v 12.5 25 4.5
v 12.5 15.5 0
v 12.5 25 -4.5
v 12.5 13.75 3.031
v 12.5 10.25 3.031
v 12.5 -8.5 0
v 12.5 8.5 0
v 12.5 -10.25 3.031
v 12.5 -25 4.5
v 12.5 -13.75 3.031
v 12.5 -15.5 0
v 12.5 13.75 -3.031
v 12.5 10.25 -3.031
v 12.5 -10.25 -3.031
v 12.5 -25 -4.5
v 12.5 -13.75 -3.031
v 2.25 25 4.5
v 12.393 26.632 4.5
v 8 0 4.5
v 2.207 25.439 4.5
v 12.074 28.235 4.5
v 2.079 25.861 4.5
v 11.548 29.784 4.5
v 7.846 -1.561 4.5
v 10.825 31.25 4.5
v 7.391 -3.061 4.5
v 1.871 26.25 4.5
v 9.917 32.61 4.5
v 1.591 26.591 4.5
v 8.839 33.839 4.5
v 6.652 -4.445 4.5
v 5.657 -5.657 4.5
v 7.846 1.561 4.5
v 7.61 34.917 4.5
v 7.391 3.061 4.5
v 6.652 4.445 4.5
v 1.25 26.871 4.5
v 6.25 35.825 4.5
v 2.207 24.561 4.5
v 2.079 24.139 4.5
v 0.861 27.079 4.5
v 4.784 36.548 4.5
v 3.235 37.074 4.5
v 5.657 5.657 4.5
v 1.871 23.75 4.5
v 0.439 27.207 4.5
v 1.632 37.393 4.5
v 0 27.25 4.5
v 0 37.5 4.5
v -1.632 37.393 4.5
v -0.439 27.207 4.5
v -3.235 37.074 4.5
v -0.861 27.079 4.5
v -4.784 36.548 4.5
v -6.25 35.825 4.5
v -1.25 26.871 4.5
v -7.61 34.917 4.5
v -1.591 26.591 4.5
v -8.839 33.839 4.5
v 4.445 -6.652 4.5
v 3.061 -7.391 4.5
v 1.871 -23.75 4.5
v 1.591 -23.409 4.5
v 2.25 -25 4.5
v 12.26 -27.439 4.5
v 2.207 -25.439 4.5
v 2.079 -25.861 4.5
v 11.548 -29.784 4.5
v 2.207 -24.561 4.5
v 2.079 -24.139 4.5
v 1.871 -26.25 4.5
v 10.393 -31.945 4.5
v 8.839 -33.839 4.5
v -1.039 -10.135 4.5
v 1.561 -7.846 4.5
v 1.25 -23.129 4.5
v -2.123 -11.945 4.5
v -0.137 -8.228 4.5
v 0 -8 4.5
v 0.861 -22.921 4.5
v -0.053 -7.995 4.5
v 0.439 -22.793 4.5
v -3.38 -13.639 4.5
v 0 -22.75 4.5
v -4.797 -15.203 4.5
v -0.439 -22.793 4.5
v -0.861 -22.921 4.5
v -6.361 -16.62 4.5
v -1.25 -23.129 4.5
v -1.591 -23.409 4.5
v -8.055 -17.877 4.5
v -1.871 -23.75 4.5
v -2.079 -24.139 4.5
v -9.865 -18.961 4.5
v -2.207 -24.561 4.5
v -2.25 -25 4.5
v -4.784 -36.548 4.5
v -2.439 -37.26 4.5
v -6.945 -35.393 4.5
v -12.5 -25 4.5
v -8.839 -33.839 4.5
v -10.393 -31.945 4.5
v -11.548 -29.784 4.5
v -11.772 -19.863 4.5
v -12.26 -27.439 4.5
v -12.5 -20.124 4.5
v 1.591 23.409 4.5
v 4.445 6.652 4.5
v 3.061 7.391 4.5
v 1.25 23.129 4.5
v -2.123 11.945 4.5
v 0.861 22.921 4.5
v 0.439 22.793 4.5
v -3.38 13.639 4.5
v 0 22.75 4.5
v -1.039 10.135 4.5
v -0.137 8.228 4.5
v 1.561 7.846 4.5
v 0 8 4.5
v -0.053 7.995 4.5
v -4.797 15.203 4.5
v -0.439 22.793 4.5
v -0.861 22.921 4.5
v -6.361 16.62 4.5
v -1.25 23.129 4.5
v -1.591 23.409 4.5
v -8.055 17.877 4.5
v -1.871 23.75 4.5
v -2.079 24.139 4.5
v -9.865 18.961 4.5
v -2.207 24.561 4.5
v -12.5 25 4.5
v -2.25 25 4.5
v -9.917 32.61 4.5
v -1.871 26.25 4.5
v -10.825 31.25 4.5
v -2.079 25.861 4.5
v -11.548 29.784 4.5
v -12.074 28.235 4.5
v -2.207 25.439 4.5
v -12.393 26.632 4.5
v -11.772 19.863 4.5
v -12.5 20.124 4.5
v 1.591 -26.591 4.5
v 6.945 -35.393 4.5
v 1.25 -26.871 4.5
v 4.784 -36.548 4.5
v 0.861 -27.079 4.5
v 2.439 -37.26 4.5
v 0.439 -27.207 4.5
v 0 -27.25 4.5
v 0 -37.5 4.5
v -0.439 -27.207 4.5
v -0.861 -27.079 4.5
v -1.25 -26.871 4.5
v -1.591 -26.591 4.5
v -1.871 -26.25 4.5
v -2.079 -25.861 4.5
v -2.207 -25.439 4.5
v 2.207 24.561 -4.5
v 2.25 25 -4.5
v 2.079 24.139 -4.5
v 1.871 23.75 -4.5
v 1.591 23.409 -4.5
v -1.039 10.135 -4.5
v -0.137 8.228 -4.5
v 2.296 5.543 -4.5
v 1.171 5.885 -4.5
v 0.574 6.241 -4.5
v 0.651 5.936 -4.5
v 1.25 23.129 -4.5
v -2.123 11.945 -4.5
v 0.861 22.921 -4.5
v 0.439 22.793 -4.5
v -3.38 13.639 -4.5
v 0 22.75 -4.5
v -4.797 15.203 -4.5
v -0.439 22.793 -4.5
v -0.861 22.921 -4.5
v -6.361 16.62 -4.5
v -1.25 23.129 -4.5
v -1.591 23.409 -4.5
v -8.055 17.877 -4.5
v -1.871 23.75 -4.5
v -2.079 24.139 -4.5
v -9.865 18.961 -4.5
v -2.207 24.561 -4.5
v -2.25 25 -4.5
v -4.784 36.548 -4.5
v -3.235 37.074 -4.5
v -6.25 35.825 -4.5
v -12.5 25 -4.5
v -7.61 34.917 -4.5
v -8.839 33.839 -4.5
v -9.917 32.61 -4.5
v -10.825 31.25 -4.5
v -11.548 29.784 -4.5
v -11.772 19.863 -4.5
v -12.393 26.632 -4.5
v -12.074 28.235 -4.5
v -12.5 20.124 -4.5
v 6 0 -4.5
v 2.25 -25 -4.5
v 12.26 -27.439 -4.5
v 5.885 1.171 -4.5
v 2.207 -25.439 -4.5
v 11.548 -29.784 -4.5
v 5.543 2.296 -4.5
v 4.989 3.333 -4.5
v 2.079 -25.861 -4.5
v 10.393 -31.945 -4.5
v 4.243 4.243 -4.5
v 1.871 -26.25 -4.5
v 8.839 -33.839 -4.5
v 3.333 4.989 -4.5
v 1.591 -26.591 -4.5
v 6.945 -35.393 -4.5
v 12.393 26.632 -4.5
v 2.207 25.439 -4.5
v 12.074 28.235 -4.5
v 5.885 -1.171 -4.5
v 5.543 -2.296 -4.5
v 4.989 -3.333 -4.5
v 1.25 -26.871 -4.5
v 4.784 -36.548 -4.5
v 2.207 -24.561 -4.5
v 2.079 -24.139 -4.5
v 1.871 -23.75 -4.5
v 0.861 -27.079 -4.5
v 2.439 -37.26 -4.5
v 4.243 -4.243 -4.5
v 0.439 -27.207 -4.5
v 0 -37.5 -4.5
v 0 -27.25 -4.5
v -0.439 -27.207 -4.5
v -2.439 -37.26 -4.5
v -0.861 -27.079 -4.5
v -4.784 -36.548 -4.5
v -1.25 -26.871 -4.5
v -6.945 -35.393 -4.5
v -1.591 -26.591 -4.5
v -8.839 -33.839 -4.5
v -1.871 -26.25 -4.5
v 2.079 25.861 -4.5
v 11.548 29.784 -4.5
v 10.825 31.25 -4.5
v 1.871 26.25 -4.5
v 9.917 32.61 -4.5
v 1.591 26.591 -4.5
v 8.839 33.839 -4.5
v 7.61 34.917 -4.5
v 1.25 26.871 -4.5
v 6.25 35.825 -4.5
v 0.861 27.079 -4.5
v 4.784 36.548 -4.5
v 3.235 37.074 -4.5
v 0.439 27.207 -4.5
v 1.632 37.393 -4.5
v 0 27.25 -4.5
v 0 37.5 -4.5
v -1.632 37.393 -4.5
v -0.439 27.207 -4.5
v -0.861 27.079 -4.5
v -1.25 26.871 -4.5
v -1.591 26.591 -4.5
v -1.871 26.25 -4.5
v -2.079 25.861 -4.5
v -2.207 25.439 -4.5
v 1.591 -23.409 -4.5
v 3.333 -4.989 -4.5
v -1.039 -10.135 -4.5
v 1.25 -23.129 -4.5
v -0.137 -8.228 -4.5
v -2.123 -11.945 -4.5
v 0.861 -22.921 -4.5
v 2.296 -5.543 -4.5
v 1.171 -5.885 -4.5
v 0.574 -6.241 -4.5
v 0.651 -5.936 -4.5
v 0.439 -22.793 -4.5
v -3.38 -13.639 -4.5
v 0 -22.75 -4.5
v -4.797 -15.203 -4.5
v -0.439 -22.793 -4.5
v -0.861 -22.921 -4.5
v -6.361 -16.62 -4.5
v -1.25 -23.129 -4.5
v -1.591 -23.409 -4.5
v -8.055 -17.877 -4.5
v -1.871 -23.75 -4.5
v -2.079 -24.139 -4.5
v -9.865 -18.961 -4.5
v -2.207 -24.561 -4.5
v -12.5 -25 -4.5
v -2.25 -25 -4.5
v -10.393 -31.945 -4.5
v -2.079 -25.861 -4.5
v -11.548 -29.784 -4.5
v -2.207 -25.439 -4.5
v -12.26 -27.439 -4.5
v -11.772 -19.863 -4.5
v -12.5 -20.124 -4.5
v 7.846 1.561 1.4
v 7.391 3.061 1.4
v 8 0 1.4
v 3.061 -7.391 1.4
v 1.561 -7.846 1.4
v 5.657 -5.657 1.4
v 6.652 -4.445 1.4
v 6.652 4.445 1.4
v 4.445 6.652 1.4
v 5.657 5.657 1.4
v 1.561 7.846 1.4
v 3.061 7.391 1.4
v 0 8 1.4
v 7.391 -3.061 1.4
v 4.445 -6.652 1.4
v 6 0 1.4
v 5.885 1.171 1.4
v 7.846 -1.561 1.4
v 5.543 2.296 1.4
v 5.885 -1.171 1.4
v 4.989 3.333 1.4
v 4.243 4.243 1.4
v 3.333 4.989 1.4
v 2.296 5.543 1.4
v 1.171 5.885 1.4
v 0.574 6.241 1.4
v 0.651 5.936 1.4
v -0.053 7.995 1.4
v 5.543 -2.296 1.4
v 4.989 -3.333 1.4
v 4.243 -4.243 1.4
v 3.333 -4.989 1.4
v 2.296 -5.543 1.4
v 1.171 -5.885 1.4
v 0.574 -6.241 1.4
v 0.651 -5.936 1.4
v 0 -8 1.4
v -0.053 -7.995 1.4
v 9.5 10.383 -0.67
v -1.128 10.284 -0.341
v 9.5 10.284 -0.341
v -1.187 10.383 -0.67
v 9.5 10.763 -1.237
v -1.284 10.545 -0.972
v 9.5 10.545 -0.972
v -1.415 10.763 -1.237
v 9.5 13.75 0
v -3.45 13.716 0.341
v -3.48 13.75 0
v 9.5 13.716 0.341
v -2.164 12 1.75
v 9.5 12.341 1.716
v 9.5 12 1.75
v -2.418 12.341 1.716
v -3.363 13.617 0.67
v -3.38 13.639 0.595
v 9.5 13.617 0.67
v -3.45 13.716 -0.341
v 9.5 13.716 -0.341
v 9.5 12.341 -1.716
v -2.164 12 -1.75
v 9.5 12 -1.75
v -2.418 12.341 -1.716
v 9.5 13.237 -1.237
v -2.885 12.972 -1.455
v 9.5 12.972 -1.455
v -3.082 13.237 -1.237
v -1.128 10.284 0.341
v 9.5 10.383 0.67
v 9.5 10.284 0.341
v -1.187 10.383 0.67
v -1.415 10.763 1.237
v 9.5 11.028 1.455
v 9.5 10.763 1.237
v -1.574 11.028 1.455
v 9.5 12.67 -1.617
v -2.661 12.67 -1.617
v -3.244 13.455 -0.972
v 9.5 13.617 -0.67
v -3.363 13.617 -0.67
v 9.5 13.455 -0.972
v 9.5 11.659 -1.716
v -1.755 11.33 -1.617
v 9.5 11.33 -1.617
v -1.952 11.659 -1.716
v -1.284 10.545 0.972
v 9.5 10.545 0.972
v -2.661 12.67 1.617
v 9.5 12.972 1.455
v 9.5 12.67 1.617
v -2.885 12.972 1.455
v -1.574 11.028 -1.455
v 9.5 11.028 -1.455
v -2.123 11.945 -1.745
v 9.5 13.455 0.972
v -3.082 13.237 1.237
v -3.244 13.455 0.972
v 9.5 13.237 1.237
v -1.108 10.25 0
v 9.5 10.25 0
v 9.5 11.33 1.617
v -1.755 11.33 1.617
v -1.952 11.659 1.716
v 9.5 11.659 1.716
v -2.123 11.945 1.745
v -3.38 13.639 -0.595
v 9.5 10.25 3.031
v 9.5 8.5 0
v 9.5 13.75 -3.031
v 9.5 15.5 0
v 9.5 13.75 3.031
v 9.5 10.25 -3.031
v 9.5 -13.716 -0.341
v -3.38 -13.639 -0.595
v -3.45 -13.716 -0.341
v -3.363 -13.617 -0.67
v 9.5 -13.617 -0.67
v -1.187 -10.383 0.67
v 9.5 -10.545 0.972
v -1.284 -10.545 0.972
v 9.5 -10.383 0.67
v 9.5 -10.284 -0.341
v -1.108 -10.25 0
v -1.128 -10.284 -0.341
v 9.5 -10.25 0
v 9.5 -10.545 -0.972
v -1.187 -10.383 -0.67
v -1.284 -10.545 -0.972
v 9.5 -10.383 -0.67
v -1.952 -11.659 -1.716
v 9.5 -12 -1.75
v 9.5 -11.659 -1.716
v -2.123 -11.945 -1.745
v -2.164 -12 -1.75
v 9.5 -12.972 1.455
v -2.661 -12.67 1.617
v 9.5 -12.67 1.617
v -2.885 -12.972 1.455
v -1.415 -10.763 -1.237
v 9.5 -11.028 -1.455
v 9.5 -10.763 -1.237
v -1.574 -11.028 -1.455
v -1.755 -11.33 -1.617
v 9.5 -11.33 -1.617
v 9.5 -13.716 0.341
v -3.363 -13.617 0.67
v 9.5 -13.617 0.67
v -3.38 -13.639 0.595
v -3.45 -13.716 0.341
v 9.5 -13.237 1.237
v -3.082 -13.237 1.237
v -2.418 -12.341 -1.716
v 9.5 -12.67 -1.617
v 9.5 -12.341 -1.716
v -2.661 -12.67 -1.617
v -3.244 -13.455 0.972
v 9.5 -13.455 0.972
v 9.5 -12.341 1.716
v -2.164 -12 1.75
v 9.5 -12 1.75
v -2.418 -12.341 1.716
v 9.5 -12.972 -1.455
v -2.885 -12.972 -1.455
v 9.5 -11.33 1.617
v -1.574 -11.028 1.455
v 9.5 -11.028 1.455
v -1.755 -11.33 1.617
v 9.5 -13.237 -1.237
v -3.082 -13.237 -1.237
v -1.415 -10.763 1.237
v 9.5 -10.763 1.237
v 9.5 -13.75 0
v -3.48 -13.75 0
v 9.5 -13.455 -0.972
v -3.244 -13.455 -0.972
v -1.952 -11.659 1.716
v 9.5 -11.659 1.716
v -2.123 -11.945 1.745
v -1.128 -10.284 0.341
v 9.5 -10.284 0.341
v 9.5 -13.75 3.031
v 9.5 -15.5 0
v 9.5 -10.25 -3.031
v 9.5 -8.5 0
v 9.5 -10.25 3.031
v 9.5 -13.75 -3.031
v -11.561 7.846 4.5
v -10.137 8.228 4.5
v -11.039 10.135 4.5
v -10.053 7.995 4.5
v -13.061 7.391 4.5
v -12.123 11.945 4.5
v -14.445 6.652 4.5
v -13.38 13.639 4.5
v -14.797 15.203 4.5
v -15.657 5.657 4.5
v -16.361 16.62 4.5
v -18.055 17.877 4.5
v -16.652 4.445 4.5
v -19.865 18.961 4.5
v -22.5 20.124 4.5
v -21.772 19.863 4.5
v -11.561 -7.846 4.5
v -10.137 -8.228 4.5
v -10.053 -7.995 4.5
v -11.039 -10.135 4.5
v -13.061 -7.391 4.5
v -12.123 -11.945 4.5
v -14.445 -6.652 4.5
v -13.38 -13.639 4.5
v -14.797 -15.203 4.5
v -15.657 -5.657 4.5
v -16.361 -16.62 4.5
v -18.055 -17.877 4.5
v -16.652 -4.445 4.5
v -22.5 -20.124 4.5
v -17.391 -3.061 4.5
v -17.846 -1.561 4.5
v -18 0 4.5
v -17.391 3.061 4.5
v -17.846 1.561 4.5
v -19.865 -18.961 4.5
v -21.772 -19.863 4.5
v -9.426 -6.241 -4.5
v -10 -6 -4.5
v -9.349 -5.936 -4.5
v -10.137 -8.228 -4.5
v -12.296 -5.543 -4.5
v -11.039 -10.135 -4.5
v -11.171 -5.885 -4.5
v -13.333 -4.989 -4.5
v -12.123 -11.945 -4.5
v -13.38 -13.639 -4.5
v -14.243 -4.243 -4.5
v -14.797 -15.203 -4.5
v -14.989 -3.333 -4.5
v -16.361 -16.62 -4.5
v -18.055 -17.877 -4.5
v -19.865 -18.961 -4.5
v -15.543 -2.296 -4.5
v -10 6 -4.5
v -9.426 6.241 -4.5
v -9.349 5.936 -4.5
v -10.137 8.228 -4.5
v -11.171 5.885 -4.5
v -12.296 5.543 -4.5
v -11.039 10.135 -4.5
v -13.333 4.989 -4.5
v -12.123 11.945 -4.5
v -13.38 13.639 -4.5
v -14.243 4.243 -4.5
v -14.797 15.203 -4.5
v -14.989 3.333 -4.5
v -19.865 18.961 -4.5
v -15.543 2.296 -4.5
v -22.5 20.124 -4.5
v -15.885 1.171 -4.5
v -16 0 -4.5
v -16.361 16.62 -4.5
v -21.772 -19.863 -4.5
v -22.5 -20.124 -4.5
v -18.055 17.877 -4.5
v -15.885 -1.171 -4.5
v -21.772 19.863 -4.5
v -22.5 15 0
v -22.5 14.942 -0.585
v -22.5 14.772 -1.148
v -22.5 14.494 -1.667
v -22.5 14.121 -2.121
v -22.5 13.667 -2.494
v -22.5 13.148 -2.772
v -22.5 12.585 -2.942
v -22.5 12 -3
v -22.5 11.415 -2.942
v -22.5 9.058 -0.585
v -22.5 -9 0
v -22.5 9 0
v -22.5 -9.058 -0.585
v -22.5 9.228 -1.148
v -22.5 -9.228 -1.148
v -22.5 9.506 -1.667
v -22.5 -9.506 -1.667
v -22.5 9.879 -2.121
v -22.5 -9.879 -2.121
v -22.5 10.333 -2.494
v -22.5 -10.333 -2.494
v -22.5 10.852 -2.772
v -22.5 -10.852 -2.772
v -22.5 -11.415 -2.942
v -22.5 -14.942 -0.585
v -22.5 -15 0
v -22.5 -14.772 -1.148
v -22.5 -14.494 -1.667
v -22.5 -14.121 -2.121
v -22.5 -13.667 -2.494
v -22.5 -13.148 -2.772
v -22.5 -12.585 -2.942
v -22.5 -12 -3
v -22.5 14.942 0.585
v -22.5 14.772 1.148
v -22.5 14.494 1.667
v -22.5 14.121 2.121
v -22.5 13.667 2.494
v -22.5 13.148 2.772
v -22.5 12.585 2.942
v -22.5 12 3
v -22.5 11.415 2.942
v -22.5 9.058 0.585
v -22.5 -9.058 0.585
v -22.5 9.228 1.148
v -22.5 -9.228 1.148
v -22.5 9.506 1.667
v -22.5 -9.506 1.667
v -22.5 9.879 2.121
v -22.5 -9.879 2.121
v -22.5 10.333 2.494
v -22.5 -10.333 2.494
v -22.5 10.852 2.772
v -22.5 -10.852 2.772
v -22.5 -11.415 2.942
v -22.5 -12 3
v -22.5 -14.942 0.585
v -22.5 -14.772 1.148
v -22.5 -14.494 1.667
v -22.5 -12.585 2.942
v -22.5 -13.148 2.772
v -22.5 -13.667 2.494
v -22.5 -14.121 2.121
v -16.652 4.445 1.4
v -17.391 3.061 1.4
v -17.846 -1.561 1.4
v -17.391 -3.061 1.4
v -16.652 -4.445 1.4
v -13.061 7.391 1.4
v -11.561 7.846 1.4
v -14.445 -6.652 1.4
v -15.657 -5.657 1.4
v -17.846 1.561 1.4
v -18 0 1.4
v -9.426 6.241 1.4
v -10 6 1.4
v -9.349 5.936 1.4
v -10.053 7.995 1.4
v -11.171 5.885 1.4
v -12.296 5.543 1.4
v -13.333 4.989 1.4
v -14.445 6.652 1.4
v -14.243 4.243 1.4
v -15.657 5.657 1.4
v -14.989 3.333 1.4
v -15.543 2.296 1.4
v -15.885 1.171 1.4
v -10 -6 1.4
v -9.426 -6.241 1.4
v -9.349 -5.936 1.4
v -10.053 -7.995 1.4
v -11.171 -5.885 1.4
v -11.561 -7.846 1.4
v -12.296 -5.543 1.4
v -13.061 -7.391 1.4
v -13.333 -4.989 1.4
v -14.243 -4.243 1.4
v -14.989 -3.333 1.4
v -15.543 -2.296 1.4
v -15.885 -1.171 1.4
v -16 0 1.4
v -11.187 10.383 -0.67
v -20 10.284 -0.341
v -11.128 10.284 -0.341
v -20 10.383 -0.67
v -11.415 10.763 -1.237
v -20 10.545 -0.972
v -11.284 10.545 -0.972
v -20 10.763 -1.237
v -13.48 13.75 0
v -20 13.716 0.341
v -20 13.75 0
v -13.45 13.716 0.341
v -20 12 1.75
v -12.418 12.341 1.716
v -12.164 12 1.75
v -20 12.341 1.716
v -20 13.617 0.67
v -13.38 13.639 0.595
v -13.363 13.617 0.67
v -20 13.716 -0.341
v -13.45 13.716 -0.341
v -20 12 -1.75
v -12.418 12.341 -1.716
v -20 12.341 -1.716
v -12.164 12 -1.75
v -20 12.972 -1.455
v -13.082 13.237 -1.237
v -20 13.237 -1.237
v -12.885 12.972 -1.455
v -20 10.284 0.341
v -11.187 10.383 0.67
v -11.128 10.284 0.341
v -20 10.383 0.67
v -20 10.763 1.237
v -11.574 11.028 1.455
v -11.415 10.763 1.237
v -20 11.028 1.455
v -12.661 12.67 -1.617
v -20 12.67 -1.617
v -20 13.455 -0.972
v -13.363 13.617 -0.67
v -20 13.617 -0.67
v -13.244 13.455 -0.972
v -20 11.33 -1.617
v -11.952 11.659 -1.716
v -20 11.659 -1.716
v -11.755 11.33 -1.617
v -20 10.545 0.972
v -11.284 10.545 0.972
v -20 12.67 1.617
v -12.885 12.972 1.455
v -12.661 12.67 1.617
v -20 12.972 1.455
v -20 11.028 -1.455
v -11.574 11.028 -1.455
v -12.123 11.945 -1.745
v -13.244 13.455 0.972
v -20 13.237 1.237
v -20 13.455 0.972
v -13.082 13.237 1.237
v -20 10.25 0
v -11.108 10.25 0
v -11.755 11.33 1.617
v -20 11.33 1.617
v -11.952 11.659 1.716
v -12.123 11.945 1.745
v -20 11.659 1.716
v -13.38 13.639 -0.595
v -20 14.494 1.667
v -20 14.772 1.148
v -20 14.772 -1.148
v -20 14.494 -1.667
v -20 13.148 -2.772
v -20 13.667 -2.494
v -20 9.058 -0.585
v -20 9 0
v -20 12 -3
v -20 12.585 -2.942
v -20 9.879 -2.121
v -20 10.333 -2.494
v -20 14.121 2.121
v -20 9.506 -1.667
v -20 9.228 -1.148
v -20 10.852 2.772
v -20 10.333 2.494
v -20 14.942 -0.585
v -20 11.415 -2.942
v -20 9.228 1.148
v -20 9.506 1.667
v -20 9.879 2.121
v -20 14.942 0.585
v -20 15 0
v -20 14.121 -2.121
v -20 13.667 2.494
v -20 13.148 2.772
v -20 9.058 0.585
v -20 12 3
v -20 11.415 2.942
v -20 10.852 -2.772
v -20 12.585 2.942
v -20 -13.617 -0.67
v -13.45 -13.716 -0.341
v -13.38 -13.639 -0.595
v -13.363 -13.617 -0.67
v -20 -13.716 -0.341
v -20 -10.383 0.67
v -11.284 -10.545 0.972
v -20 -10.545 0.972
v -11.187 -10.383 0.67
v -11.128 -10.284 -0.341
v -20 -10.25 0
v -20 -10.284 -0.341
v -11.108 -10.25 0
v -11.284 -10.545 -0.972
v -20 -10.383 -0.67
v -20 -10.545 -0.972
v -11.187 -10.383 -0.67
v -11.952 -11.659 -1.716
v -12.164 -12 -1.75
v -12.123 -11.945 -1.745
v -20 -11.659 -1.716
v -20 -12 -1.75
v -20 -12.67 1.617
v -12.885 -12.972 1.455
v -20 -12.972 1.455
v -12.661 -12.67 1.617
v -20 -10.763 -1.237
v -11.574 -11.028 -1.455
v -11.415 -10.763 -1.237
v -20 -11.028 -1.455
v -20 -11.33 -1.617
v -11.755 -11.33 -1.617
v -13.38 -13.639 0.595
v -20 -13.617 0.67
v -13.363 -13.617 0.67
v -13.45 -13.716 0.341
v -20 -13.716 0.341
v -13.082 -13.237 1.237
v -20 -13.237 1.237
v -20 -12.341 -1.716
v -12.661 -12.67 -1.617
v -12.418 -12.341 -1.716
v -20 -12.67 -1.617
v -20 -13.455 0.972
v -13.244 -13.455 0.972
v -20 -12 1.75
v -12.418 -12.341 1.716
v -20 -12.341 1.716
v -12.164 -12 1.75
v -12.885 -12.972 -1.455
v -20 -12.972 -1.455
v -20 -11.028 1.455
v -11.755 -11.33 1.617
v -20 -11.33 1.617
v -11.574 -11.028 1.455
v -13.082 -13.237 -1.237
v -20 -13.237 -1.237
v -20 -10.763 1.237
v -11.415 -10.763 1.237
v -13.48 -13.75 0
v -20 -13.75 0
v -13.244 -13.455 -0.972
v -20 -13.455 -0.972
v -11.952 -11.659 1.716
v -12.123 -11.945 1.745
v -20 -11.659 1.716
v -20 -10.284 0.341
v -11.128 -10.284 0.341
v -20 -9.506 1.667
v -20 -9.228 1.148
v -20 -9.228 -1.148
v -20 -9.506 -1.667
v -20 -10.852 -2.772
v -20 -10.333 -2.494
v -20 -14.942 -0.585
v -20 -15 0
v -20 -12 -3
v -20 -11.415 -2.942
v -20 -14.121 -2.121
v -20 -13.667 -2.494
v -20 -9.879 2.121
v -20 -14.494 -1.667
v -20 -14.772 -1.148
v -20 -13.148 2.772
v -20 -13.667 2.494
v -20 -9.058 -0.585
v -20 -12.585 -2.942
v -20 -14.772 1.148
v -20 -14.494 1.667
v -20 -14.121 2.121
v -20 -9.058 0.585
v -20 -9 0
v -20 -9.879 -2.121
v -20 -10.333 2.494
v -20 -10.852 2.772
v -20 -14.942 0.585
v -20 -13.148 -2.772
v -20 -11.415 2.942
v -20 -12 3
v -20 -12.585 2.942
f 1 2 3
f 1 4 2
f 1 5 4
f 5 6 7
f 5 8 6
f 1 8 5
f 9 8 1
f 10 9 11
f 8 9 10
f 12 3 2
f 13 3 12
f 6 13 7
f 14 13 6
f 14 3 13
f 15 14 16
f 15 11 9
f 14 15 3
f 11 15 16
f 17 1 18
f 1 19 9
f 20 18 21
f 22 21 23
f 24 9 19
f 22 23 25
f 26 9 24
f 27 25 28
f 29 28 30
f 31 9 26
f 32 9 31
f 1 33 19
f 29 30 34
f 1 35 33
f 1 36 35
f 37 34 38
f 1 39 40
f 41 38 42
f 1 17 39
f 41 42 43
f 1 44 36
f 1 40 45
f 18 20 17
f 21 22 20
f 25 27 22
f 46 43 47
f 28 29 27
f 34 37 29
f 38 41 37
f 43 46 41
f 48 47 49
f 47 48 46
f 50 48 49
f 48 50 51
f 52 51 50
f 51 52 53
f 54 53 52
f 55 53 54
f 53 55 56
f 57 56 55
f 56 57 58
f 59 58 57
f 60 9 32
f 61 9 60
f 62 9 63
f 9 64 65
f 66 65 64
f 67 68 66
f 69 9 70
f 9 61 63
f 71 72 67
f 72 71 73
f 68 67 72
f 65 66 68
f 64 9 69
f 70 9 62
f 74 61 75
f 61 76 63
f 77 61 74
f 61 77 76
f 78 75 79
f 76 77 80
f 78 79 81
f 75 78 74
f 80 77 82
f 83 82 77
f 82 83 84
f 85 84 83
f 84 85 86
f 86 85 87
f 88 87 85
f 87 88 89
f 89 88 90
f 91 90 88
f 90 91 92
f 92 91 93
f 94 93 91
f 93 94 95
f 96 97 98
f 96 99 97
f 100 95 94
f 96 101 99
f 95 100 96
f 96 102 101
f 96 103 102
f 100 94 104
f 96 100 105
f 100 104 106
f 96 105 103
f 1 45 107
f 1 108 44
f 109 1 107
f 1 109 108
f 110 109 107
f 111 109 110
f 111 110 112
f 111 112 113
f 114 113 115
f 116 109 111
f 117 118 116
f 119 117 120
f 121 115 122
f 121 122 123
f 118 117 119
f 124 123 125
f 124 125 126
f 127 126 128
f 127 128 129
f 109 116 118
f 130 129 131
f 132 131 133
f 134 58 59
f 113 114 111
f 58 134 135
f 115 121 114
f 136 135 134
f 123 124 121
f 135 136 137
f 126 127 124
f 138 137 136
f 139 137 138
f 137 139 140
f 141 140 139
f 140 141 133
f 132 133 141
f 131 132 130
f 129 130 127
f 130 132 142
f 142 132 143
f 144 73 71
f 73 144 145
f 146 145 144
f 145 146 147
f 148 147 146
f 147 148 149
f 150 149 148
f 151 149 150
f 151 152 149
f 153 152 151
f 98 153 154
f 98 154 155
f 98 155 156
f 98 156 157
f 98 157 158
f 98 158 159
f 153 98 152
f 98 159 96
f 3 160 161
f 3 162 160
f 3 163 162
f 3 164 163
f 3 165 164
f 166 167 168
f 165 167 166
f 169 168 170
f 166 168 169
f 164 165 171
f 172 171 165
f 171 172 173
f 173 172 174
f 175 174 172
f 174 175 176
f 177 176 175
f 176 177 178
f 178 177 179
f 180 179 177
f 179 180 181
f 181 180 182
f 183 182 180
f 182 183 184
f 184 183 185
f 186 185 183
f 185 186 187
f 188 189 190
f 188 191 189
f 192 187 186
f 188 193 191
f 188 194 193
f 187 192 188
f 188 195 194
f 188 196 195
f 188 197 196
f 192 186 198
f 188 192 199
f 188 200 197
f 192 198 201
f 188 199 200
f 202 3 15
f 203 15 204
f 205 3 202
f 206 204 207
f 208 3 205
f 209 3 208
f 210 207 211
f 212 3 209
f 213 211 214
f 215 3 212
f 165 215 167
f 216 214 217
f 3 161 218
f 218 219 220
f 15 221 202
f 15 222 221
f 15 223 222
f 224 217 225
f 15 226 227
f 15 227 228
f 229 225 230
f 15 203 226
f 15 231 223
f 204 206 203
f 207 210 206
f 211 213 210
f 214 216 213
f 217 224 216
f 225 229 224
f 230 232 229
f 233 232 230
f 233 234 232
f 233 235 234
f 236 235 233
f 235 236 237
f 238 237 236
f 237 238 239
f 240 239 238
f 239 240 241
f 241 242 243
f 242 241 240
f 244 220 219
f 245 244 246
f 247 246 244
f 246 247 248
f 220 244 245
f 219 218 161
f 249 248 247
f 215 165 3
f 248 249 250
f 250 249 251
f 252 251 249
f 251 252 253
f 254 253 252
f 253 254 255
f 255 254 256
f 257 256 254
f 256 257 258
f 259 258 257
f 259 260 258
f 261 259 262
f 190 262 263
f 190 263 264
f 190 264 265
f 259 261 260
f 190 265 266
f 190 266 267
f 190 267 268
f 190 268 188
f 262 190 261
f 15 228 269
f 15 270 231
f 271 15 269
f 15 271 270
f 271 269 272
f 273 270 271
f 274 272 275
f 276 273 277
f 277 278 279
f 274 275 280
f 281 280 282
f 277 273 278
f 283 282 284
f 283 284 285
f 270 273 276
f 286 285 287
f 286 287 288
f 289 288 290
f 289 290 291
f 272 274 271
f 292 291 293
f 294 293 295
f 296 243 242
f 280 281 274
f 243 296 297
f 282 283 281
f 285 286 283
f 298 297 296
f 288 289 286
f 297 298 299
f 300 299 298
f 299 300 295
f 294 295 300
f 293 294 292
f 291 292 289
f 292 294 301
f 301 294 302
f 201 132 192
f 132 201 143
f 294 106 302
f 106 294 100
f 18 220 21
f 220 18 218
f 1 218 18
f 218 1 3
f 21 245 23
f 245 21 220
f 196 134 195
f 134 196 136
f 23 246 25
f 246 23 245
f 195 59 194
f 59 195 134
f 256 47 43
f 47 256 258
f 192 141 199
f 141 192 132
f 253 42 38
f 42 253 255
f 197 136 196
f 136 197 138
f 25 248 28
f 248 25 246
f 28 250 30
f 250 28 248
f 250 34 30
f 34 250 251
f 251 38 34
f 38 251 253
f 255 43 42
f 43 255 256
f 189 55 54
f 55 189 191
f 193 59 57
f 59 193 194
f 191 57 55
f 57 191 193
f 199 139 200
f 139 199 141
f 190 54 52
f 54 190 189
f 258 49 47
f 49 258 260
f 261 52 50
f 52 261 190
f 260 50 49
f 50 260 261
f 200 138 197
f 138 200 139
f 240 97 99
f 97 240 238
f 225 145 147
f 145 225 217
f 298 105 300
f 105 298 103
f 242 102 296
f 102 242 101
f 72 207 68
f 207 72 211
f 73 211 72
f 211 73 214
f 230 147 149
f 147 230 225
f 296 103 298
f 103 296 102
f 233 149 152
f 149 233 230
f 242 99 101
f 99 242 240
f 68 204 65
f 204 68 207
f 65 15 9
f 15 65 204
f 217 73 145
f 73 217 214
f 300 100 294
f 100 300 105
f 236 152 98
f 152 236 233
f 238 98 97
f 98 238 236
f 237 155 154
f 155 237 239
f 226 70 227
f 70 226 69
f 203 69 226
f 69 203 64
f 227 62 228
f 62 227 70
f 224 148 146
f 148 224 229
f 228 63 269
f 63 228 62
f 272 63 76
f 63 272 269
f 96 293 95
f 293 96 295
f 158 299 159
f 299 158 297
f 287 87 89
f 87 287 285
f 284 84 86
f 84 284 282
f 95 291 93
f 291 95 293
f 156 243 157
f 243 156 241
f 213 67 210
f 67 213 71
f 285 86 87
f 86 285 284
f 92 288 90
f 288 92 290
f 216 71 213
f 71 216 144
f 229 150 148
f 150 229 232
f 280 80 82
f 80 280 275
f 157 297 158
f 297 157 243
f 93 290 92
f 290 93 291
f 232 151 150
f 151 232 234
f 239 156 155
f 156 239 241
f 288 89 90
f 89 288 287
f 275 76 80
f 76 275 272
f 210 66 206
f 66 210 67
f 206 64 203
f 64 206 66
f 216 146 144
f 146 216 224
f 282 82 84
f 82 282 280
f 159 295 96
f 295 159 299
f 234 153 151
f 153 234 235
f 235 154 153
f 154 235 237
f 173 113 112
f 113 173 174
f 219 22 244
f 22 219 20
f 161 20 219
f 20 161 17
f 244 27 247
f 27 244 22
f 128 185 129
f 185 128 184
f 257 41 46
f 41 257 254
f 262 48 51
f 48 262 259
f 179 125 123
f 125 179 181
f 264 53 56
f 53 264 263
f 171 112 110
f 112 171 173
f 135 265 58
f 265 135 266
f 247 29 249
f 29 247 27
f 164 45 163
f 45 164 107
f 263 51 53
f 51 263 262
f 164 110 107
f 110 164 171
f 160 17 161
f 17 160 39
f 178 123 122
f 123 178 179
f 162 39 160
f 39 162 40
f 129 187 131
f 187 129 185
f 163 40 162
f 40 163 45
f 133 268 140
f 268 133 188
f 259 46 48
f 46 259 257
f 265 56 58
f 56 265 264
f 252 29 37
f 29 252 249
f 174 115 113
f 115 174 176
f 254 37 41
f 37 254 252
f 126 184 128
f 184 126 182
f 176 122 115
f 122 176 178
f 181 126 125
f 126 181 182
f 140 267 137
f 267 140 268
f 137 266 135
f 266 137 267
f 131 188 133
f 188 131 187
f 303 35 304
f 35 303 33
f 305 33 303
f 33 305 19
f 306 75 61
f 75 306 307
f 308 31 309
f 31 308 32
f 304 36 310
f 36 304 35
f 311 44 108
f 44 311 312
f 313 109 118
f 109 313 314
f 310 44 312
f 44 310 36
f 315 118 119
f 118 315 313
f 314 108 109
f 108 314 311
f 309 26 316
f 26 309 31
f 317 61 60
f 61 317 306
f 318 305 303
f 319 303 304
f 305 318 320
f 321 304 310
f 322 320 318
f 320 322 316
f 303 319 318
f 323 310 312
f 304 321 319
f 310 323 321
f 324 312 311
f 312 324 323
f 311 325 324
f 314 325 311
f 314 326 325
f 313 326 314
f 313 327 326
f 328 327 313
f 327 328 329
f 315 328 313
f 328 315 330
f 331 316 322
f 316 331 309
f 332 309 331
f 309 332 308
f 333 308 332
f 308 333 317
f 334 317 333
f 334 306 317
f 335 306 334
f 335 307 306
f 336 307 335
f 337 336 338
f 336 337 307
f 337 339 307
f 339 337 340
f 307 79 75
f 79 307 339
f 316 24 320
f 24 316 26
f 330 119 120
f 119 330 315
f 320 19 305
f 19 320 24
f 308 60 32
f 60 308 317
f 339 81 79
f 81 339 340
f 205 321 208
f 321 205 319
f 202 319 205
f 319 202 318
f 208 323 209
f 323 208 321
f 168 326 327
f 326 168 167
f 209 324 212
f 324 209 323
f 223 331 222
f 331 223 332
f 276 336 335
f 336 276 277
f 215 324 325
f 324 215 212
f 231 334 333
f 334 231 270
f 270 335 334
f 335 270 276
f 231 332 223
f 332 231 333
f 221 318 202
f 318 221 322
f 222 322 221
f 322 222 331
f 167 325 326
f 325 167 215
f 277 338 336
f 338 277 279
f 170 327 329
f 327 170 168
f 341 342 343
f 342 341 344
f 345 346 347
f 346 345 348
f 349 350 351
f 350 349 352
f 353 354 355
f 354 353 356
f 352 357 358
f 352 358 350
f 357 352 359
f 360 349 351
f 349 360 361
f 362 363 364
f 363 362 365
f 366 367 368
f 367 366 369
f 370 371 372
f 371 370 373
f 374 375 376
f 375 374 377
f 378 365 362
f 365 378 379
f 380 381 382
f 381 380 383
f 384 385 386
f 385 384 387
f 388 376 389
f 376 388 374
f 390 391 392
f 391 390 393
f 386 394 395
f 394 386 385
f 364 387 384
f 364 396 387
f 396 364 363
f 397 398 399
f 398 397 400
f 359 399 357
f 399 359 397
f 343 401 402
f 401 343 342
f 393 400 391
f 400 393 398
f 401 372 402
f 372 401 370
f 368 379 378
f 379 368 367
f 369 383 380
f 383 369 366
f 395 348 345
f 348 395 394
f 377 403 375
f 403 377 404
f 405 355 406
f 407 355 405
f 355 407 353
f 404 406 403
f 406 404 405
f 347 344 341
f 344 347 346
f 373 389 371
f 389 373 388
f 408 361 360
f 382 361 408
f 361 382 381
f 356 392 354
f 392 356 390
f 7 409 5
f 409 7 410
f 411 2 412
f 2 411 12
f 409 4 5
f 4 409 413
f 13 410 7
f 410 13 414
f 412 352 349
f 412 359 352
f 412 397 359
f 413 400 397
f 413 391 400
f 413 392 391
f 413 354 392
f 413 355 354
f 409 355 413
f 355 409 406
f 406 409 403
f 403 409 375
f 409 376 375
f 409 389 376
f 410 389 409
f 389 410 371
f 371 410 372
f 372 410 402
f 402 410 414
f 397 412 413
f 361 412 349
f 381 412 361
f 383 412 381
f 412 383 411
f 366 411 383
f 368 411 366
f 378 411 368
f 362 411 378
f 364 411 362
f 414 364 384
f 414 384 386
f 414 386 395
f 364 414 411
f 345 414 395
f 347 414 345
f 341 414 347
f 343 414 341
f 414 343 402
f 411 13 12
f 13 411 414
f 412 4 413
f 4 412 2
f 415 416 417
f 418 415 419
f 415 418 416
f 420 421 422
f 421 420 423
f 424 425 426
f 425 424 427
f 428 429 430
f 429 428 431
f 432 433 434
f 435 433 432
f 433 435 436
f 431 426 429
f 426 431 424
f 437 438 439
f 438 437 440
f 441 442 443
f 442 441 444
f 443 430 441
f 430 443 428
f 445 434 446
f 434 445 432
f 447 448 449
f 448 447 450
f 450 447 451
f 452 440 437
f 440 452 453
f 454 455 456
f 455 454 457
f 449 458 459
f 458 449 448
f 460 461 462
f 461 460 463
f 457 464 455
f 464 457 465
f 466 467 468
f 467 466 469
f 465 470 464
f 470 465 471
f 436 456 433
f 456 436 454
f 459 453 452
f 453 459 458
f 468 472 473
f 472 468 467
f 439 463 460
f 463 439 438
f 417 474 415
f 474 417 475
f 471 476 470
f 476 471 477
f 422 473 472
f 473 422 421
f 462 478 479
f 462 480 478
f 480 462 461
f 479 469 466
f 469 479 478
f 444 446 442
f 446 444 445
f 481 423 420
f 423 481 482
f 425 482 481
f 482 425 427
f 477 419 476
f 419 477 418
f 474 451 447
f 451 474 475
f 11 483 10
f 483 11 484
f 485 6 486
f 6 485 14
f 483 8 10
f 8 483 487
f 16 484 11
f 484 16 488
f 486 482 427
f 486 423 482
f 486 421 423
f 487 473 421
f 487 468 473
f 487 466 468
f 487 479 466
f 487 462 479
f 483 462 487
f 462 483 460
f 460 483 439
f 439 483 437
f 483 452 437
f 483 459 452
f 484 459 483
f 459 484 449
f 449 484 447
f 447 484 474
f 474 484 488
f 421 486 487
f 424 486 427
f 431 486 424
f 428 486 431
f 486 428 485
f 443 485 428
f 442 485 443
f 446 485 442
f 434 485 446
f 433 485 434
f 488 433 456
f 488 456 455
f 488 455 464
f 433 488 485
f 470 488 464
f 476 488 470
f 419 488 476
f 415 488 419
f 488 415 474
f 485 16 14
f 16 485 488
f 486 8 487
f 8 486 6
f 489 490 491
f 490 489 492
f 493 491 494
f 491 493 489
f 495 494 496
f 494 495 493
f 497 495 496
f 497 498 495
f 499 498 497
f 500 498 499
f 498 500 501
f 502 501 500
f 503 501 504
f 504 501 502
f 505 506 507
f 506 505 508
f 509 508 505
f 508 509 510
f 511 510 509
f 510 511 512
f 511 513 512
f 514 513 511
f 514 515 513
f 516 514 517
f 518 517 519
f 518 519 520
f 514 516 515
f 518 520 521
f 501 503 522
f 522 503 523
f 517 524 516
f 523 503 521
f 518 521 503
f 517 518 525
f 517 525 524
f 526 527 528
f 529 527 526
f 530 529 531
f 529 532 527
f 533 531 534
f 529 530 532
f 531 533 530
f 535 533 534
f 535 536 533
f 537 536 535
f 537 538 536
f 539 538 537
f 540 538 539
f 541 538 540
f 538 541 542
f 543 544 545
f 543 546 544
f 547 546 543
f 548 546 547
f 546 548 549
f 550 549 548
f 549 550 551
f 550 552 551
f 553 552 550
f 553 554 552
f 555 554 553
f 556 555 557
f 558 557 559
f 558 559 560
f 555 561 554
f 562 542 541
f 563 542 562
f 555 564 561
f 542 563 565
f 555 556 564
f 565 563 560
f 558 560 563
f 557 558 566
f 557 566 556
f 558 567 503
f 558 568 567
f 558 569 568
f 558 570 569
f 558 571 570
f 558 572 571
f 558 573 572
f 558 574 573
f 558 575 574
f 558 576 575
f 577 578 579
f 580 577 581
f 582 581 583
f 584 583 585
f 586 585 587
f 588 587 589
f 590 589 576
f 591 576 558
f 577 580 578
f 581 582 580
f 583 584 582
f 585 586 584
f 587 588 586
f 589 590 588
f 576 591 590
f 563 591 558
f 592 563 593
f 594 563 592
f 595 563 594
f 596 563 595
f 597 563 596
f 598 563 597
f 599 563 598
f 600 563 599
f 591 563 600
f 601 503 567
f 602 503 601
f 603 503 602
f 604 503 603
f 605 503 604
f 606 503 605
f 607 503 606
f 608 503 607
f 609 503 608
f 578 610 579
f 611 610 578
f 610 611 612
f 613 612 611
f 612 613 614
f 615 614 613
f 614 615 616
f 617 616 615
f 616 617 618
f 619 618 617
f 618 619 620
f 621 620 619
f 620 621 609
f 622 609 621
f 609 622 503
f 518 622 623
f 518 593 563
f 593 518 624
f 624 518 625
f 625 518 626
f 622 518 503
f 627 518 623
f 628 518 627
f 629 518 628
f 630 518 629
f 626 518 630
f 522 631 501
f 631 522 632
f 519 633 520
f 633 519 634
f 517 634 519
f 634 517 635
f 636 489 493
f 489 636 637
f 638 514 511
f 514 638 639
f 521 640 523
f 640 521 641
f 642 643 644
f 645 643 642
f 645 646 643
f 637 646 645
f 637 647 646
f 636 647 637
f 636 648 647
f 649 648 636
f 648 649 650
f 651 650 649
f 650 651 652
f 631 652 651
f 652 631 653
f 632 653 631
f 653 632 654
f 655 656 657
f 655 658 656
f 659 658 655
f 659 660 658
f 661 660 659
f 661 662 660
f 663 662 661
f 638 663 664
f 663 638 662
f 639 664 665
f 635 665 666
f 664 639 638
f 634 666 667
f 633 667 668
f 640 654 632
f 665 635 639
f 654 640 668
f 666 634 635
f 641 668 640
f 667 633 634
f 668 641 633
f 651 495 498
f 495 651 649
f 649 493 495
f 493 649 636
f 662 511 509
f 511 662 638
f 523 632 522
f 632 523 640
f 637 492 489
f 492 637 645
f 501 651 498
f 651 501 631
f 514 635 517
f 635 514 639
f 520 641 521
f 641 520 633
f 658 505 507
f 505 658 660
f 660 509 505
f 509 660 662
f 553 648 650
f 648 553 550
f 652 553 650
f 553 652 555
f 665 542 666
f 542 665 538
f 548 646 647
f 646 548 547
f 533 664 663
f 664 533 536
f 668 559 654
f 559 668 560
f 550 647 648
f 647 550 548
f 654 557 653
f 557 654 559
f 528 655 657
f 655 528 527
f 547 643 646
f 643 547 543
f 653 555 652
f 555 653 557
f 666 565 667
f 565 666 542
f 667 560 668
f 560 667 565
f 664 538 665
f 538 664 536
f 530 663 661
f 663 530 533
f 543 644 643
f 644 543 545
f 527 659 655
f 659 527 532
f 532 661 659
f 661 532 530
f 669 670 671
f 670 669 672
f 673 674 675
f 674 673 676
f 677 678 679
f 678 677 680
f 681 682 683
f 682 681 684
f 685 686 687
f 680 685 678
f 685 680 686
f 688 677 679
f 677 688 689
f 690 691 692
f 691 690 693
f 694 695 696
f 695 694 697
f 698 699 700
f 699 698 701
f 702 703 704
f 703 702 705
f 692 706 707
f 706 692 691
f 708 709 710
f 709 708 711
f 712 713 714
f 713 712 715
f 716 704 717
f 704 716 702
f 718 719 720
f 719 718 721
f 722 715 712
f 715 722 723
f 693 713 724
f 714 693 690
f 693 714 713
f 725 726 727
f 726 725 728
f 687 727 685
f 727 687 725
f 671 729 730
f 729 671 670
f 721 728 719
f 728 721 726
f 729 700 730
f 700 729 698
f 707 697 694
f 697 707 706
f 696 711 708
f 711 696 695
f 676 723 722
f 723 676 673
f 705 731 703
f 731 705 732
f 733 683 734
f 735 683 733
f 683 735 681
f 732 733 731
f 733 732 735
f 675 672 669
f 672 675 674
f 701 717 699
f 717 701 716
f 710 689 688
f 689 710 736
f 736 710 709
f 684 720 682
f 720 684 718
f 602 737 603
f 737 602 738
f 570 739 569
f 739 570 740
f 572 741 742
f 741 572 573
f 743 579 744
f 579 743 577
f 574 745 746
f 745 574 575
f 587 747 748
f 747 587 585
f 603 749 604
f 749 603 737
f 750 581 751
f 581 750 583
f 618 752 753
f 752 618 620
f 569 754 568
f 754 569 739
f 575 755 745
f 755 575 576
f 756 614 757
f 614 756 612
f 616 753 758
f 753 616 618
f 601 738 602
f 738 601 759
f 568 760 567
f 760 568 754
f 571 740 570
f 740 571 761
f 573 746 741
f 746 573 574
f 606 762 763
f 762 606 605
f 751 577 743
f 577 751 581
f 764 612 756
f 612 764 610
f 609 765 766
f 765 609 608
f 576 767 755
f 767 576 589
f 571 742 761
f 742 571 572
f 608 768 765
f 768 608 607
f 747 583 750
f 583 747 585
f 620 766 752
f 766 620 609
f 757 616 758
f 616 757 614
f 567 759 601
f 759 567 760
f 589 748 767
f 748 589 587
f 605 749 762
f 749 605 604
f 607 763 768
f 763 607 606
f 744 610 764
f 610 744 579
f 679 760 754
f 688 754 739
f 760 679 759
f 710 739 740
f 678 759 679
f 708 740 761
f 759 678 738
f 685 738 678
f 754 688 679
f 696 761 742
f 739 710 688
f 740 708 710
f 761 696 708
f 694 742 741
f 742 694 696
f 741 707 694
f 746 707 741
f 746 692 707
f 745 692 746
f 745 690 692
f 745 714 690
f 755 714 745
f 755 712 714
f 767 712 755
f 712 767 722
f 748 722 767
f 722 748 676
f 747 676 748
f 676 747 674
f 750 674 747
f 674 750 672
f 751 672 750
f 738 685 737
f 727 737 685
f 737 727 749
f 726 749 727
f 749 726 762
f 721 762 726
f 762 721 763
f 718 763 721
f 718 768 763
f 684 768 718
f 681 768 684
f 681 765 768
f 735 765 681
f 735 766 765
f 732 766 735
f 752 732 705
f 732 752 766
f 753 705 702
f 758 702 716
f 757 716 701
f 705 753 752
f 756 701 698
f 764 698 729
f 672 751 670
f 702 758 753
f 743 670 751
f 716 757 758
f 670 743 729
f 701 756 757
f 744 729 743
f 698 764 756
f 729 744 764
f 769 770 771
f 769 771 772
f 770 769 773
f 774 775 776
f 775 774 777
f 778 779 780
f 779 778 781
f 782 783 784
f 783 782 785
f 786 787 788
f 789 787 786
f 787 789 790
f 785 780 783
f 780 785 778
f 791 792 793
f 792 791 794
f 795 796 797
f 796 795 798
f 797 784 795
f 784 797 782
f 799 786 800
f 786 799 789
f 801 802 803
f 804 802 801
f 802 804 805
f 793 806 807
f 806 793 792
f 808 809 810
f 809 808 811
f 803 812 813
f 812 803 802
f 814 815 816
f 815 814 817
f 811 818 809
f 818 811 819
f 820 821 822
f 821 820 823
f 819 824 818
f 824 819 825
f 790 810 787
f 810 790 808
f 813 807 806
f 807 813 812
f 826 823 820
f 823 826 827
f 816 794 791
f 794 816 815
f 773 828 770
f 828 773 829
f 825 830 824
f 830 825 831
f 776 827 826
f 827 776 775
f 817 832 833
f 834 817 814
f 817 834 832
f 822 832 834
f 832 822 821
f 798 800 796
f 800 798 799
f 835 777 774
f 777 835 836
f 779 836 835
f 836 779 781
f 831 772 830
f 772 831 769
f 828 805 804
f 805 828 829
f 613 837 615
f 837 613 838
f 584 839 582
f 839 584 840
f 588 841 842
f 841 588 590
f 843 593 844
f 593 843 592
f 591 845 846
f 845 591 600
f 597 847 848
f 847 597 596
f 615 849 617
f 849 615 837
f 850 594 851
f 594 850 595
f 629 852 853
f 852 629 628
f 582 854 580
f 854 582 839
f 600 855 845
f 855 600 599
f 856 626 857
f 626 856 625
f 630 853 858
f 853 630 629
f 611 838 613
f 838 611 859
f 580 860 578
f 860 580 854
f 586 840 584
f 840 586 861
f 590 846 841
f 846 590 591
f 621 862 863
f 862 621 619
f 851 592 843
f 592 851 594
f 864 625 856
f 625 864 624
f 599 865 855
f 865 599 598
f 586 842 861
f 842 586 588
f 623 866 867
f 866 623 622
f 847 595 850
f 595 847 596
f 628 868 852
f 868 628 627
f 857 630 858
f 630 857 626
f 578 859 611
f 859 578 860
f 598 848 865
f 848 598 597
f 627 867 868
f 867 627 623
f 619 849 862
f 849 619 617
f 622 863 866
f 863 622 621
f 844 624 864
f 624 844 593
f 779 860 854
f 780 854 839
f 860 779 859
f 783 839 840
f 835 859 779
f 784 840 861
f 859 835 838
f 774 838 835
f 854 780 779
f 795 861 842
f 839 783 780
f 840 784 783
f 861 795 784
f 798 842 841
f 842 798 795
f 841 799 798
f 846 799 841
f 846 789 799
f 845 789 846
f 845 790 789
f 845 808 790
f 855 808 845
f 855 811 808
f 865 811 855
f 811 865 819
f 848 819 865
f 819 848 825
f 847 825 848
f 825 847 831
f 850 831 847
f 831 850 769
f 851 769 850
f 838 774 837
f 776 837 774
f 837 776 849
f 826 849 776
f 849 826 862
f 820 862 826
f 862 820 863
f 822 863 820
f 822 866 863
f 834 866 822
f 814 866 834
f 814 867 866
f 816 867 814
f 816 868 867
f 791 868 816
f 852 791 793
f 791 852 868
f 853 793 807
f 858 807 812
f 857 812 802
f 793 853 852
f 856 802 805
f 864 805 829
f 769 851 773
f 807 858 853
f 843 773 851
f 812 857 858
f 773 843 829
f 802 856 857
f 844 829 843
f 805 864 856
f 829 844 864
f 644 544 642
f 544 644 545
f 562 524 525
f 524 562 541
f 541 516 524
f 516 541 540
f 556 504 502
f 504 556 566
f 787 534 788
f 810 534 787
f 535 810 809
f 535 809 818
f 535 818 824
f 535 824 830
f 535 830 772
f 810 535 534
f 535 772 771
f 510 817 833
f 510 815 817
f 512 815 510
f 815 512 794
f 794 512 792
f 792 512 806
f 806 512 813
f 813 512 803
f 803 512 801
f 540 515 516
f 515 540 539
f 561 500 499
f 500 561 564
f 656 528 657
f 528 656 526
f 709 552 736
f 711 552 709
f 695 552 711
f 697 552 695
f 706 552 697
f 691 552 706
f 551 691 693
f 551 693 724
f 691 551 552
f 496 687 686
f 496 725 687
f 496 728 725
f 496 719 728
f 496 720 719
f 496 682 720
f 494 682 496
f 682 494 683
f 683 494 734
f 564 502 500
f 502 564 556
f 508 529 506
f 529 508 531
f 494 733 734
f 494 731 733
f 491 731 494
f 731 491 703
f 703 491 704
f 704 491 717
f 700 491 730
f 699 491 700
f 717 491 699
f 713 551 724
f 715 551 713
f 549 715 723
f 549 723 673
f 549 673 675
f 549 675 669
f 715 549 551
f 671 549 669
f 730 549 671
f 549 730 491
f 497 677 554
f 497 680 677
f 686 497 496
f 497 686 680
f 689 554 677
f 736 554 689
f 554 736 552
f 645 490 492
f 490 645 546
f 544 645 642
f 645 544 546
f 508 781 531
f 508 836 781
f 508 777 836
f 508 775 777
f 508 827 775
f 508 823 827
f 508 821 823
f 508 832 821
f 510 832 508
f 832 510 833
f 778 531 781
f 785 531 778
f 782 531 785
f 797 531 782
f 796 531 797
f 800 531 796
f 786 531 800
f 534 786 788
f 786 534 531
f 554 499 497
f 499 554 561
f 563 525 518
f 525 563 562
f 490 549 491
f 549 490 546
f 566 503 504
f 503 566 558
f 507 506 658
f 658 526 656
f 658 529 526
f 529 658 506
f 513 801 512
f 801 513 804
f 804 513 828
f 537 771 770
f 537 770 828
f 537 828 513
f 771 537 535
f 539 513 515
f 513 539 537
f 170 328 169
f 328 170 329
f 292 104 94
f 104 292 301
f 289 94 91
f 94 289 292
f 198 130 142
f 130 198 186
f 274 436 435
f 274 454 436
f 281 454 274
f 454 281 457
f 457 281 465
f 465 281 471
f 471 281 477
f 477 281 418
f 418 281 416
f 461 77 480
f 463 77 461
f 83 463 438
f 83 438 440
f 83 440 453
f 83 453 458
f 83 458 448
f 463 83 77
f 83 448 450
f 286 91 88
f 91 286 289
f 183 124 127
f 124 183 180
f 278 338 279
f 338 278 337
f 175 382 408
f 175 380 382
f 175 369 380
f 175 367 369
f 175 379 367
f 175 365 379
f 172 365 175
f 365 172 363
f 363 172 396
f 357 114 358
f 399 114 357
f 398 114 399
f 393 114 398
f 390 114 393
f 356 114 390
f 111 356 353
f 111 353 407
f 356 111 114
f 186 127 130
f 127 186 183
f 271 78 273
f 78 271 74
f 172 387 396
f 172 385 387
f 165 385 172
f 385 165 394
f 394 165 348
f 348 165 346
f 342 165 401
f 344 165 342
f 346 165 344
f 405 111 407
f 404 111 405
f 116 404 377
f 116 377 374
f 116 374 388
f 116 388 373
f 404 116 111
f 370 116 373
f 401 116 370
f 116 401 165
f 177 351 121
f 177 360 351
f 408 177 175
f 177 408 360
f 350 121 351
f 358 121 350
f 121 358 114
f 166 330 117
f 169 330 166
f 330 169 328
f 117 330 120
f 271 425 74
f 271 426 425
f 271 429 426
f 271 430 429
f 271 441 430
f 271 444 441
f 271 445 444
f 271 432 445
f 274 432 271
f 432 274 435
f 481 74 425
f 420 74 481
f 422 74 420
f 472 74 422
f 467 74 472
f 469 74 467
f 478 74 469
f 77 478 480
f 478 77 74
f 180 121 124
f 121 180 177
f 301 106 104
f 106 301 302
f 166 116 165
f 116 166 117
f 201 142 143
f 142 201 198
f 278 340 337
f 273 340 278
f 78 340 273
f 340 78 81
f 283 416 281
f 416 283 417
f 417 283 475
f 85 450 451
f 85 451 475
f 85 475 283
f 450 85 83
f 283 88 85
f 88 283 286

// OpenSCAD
// J-Head (E3D) mount
// https://www.thingiverse.com/thing:148536/
//
// copyright (c) 2013 - Jarek Szczepanski <imrahil@imrahil.com>
// oryginal design derived from http://www.thingiverse.com/thing:26355

length = 25;
height = 9;

mount_spacing = 50;
carriage_mount_dia = 4.5;

// dimensions for E3D hotned //2.9 5.9 7.0
extruder_dia = 16;
extruder_dia2 = 12;
extruder_cyl2_height = 5.9; //5.6 // inner grip height
extruder_cyl1_height = height-extruder_cyl2_height;//5.9; //3.7

mount_screws_dia = 3.5;


// main module
main();

module main() {
  translate([-10, 0, 0]){
    intersection() {
      mount();
      separator();
    }
  }

  difference() {
    mount();
    separator();
  }
}

module mount() {
  difference() {
    plate();
    extruder();
    mount_screws();
  }
}

module plate() {
  difference() {
    union() {
      cube([length, mount_spacing, height],center=true);			// center
      translate([0,mount_spacing/2,0]){
        cylinder(r=length/2, h=height, center=true, $fn=48); 	// round corner
      }

      translate([0, -mount_spacing/2,0]){
        cylinder(r=length/2, h=height, center=true, $fn=32); 	// round corner
      }
    }

    translate([0, -mount_spacing/2,0]){
      cylinder(r=carriage_mount_dia/2, h=height + 1, center=true, $fn=32);	// carriage mount hole
    }

    translate([0, mount_spacing/2,0]){
      cylinder(r=carriage_mount_dia/2, h=height + 1, center=true, $fn=32); // carriage mount hole
    }
  }
}

module extruder() {
  pos1 = height/2 - extruder_cyl1_height/2 + 0.5;
  pos2 = height/2 - extruder_cyl1_height - extruder_cyl2_height/2;

  union() {
    translate([0, 0, pos1]){
      cylinder(r=extruder_dia/2, h=extruder_cyl1_height + 1, center=true, $fn=32); 
    }

    translate([0, 0, pos2]){
      cylinder(r=extruder_dia2/2, h=extruder_cyl2_height, center=true, $fn=32); 
    }	
  }
}

module mount_screws() {
  union() {
    translate([0, 12, 0]){
      rotate([0, 90, 0]) cylinder(r=mount_screws_dia/2, h=length + 1, center=true, $fn=32); // hole for nut
      translate([length/2 - 3, 0, 0]){
        rotate([-90, 0, -90]) cylinder(r=mount_screws_dia, h=4, $fn=6); 
      }
      translate([-length/2 - 0.5, 0, 0]){
        rotate([0, 90, 0]) cylinder(r=3, h=3, $fn=32); // hole for screw's head
      }
    }

    translate([0, -12, 0]){
      rotate([0, 90, 0]) cylinder(r=mount_screws_dia/2, h=length + 1, center=true, $fn=32); // hole for nut 
      translate([length/2 - 3, 0, 0]){
        rotate([-90, 0, -90]) cylinder(r=mount_screws_dia, h=4, $fn=6); 
      }
      translate([-length/2 - 0.5, 0, 0]){
        rotate([0, 90, 0]) cylinder(r=3, h=3, $fn=32); // hole for screw's head 
      }
    }
  }
}

module separator() {
  translate([-20, 0, 0]){
    cylinder(r=43/2, h=height + 1, center=true, $fn=64); 
  }
}
